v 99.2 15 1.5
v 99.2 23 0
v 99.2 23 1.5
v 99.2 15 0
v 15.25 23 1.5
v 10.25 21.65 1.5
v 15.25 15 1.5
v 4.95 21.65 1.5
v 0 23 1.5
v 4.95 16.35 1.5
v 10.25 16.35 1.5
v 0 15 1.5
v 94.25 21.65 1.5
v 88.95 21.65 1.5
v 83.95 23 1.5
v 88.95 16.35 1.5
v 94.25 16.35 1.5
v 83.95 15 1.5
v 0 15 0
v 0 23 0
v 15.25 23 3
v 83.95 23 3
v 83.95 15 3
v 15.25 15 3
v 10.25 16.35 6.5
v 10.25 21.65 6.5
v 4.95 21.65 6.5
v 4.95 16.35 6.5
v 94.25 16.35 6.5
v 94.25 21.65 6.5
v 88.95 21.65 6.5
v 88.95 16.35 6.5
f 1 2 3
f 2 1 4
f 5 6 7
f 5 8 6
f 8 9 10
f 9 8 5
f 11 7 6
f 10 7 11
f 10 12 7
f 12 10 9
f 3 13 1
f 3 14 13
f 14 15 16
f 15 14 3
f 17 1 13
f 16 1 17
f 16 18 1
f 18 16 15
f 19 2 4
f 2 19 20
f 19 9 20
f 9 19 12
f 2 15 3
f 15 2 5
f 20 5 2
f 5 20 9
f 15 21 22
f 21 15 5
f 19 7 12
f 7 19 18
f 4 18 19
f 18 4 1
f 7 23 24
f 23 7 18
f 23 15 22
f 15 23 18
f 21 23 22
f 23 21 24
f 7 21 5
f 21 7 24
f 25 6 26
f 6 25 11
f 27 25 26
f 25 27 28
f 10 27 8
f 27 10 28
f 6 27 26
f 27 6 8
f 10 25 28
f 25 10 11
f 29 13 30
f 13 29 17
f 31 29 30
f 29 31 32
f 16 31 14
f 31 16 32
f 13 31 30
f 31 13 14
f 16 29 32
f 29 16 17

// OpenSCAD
// ================

// bearings 8x22x7
// spools are 88 x (80+56+80 = d216 r108)

// SET THIS which spool are you using?
// spool width: 88mm = 1kg spool, 54mm = 700g spool, 65mm = 1kg Inland spools
spoolw=88; // 
// spoolw=54; 


// holder wheel width
bwc=10;

// TWEAK THIS depending on material and printer:

// wheel plate to side bar clip material margin 
sscm=0.05;

// ================

// width of spool side wheel 
spoolww=4;

spooldd=spoolw-spoolww; // center of side wheel to center of side wheel

// holder wheel margin to sides
bwcm=1;

// holder side thickness
bht=1.6;

bhw=bwc+bwcm*2+bht*2; // total width

// side to side bar distance from wheel center
sswd=15;

// side to side bar depth
ssd=8;

// side to side bar height
ssh=1.5;

// side to side bar in between height
ssh2=3;

// side to side bar clip height
ssch=5;

// side to side bar clip depth
sscd=5.4;

// side to side bar clip width
sscw=5.4;

// side to side bar height margin (executed on side bar)
sshm=0.8;

// side to side bar height margin (executed on side bar)
ssdm=0.4;


// ================
// library

module box(pos,size) { translate(pos) cube(size); }

module torus(pos=[0,0,0],r1=10,r2=2,angle=360)
{
   translate(pos)
   rotate_extrude(angle=angle)
      translate([r1,0]) circle(r=r2);
}

module cyl_y(base=[0,0,0],h=10,r=5)
{
   translate(base) rotate([-90,0,0]) cylinder(h=h,r=r);
}

module cyl_x(base=[0,0,0],h=10,r=5)
{
   translate(base)
      rotate([0,90,0])
      cylinder(h=h,r=r);
}

module cyl_z(base=[0,0,0],h=10,r=5)
{
   translate(base) cylinder(h=h,r=r);
}

// ================

module spooldemo(dist=spoolw,d=spoold,id=56)
{
   cyl_x([-dist/2,0,0],h=spoolww,r=d/2);
   cyl_x([dist/2-spoolww,0,0],h=spoolww,r=d/2);
}

module bearing_demo(efr=0)
{
   difference() 
   {
      cyl_x([0,0,wh],h=bew,r=bwd/2+efr);
      cyl_x([0-1,0,wh],h=bew+2,r=bwi/2);
   }
}

module sidebar(dist=spooldd)
{
   union()
   {
      box([0,sswd,0],[bhw+dist,ssd,ssh]); // full
      box([bhw+sscm,sswd,0],[dist-bhw-sscm*2,ssd,ssh2]); // between 
      box([bhw/2-sscw/2+sscm,sswd+ssd/2-sscd/2+sscm,0.1],[sscw-sscm*2,sscd-sscm*2,ssch+ssh-0.1]); // box left
      box([dist+bhw/2-sscw/2+sscm,sswd+ssd/2-sscd/2+sscm,0.1],[sscw-sscm*2,sscd-sscm*2,ssch+ssh-0.1]); // box right
   }
}

sidebar();
